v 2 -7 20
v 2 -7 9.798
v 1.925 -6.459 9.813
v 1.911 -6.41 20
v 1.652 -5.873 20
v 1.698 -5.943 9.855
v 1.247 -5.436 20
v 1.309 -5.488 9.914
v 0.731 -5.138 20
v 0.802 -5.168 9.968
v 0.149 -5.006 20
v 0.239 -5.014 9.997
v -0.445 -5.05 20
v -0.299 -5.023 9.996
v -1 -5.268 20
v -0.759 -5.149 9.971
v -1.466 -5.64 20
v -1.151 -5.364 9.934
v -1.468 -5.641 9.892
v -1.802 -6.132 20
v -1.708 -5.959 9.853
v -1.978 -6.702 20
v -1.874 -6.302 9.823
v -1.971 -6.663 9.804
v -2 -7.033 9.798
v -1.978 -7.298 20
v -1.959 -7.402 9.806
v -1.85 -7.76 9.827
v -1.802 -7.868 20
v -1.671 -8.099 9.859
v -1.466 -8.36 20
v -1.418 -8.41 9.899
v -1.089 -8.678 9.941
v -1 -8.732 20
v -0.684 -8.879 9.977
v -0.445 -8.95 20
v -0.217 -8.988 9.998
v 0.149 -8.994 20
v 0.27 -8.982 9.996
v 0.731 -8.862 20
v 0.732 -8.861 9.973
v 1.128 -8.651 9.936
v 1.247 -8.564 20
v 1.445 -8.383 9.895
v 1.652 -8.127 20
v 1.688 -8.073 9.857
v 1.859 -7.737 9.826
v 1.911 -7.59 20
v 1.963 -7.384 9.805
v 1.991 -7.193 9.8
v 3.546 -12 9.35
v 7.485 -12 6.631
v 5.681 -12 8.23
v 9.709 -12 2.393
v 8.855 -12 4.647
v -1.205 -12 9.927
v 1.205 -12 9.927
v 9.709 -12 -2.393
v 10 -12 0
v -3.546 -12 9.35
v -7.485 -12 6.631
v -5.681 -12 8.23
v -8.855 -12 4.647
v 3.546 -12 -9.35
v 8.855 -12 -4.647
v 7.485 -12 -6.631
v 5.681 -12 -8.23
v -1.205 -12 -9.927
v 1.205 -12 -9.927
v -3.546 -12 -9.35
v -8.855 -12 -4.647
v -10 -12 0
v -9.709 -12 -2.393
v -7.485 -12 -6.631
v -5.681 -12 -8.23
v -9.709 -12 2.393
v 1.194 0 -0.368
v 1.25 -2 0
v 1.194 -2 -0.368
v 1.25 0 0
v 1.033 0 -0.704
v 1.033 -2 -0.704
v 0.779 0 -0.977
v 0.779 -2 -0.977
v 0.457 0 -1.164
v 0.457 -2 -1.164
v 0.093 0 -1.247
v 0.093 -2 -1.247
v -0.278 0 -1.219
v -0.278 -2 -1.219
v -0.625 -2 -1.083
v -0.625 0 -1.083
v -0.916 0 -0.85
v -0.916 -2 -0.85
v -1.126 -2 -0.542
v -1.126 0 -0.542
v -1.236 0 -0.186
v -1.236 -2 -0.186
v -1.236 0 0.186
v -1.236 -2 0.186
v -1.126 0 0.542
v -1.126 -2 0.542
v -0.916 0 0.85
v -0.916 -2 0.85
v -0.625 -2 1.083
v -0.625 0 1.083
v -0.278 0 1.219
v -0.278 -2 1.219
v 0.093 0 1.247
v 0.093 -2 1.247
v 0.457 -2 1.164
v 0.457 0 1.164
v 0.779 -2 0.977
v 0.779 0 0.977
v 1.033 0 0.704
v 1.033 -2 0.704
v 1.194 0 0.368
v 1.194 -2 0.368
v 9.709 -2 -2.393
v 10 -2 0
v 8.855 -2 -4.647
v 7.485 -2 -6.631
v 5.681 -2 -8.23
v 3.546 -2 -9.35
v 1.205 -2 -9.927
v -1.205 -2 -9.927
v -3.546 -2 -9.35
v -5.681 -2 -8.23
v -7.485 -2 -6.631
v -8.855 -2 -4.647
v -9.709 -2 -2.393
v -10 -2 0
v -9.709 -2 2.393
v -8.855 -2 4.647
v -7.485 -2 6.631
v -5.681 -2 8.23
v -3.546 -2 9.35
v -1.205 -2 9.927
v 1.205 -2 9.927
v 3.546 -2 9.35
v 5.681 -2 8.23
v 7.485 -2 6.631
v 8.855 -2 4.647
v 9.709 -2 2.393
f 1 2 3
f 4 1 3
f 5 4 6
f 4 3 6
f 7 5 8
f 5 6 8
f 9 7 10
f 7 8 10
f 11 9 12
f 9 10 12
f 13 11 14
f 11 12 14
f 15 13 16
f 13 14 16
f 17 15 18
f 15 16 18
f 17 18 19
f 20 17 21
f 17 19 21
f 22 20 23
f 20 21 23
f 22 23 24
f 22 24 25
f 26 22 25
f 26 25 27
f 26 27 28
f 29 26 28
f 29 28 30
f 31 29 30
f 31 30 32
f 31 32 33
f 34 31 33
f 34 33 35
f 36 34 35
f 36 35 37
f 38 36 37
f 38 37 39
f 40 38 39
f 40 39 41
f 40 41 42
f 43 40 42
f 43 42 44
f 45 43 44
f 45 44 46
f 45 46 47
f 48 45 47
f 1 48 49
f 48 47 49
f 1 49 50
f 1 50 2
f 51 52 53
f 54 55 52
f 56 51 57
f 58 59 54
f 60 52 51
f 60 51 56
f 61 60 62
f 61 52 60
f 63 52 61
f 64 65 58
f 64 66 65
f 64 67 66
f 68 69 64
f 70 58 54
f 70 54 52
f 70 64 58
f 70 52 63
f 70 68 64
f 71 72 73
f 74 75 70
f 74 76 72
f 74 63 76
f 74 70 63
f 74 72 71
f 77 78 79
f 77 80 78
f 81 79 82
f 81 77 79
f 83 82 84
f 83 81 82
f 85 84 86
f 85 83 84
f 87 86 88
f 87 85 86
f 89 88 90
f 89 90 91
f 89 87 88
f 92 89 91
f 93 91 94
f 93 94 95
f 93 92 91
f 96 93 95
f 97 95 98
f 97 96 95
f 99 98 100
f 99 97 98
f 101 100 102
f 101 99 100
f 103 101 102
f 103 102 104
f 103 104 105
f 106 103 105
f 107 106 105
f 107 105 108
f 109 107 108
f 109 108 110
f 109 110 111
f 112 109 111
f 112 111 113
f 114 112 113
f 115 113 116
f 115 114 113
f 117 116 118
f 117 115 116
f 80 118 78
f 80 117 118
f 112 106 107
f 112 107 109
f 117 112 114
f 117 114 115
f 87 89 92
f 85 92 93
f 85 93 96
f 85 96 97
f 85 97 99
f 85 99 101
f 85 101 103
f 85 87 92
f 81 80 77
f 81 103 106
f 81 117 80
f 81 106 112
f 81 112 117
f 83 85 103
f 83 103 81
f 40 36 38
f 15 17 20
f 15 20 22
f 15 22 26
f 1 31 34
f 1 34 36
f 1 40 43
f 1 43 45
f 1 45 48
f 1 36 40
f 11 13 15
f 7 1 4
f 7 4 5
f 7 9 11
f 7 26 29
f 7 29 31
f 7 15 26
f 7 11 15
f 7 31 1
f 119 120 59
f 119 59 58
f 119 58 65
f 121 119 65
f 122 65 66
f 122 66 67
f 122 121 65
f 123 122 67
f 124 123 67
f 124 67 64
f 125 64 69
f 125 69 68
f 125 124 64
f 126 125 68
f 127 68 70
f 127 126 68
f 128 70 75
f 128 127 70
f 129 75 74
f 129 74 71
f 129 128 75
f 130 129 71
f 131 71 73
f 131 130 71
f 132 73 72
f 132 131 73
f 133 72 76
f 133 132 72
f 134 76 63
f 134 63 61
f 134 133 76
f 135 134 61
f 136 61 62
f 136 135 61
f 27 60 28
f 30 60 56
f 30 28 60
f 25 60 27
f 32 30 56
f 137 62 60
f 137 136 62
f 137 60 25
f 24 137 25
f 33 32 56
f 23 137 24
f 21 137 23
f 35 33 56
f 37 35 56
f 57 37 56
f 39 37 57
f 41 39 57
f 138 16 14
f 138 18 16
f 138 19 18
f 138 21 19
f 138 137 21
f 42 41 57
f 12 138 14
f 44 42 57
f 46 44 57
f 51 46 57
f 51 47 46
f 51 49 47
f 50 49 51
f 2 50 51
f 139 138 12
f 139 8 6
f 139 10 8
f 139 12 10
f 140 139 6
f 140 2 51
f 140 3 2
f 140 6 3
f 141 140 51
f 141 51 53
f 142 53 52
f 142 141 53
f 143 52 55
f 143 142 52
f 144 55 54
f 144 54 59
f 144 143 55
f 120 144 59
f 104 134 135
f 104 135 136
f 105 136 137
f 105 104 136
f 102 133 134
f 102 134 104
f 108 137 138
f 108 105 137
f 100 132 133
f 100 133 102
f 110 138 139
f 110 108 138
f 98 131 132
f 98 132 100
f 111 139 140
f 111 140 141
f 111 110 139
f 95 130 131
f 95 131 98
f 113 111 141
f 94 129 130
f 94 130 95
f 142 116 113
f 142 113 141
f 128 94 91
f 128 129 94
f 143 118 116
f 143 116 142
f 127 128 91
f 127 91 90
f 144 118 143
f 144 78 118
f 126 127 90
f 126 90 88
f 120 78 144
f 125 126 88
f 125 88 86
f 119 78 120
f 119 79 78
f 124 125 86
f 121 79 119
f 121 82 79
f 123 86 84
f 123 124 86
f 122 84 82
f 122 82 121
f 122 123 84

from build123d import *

# Parameters (mm, degrees)
SKETCH2_R           = 2
BOSS_EXTRUDE1_DEPTH = 20


with BuildPart() as part:
    # Sketch1 → Revolve1 (revolve)
    with BuildSketch(Plane.XY):
        Polygon((0, 0), (0, -12), (10, -12), (10, -2), (1.25, -2), (1.25, 0), align=None)
    revolve(axis=Axis((0, 0, 0), (0, 1, 0)))

    # Sketch2 → Boss-Extrude1 (add)
    with BuildSketch(Plane.XY):
        with Locations((0, -7)):
            Circle(SKETCH2_R)
    extrude(amount=BOSS_EXTRUDE1_DEPTH)


solid = part.part
